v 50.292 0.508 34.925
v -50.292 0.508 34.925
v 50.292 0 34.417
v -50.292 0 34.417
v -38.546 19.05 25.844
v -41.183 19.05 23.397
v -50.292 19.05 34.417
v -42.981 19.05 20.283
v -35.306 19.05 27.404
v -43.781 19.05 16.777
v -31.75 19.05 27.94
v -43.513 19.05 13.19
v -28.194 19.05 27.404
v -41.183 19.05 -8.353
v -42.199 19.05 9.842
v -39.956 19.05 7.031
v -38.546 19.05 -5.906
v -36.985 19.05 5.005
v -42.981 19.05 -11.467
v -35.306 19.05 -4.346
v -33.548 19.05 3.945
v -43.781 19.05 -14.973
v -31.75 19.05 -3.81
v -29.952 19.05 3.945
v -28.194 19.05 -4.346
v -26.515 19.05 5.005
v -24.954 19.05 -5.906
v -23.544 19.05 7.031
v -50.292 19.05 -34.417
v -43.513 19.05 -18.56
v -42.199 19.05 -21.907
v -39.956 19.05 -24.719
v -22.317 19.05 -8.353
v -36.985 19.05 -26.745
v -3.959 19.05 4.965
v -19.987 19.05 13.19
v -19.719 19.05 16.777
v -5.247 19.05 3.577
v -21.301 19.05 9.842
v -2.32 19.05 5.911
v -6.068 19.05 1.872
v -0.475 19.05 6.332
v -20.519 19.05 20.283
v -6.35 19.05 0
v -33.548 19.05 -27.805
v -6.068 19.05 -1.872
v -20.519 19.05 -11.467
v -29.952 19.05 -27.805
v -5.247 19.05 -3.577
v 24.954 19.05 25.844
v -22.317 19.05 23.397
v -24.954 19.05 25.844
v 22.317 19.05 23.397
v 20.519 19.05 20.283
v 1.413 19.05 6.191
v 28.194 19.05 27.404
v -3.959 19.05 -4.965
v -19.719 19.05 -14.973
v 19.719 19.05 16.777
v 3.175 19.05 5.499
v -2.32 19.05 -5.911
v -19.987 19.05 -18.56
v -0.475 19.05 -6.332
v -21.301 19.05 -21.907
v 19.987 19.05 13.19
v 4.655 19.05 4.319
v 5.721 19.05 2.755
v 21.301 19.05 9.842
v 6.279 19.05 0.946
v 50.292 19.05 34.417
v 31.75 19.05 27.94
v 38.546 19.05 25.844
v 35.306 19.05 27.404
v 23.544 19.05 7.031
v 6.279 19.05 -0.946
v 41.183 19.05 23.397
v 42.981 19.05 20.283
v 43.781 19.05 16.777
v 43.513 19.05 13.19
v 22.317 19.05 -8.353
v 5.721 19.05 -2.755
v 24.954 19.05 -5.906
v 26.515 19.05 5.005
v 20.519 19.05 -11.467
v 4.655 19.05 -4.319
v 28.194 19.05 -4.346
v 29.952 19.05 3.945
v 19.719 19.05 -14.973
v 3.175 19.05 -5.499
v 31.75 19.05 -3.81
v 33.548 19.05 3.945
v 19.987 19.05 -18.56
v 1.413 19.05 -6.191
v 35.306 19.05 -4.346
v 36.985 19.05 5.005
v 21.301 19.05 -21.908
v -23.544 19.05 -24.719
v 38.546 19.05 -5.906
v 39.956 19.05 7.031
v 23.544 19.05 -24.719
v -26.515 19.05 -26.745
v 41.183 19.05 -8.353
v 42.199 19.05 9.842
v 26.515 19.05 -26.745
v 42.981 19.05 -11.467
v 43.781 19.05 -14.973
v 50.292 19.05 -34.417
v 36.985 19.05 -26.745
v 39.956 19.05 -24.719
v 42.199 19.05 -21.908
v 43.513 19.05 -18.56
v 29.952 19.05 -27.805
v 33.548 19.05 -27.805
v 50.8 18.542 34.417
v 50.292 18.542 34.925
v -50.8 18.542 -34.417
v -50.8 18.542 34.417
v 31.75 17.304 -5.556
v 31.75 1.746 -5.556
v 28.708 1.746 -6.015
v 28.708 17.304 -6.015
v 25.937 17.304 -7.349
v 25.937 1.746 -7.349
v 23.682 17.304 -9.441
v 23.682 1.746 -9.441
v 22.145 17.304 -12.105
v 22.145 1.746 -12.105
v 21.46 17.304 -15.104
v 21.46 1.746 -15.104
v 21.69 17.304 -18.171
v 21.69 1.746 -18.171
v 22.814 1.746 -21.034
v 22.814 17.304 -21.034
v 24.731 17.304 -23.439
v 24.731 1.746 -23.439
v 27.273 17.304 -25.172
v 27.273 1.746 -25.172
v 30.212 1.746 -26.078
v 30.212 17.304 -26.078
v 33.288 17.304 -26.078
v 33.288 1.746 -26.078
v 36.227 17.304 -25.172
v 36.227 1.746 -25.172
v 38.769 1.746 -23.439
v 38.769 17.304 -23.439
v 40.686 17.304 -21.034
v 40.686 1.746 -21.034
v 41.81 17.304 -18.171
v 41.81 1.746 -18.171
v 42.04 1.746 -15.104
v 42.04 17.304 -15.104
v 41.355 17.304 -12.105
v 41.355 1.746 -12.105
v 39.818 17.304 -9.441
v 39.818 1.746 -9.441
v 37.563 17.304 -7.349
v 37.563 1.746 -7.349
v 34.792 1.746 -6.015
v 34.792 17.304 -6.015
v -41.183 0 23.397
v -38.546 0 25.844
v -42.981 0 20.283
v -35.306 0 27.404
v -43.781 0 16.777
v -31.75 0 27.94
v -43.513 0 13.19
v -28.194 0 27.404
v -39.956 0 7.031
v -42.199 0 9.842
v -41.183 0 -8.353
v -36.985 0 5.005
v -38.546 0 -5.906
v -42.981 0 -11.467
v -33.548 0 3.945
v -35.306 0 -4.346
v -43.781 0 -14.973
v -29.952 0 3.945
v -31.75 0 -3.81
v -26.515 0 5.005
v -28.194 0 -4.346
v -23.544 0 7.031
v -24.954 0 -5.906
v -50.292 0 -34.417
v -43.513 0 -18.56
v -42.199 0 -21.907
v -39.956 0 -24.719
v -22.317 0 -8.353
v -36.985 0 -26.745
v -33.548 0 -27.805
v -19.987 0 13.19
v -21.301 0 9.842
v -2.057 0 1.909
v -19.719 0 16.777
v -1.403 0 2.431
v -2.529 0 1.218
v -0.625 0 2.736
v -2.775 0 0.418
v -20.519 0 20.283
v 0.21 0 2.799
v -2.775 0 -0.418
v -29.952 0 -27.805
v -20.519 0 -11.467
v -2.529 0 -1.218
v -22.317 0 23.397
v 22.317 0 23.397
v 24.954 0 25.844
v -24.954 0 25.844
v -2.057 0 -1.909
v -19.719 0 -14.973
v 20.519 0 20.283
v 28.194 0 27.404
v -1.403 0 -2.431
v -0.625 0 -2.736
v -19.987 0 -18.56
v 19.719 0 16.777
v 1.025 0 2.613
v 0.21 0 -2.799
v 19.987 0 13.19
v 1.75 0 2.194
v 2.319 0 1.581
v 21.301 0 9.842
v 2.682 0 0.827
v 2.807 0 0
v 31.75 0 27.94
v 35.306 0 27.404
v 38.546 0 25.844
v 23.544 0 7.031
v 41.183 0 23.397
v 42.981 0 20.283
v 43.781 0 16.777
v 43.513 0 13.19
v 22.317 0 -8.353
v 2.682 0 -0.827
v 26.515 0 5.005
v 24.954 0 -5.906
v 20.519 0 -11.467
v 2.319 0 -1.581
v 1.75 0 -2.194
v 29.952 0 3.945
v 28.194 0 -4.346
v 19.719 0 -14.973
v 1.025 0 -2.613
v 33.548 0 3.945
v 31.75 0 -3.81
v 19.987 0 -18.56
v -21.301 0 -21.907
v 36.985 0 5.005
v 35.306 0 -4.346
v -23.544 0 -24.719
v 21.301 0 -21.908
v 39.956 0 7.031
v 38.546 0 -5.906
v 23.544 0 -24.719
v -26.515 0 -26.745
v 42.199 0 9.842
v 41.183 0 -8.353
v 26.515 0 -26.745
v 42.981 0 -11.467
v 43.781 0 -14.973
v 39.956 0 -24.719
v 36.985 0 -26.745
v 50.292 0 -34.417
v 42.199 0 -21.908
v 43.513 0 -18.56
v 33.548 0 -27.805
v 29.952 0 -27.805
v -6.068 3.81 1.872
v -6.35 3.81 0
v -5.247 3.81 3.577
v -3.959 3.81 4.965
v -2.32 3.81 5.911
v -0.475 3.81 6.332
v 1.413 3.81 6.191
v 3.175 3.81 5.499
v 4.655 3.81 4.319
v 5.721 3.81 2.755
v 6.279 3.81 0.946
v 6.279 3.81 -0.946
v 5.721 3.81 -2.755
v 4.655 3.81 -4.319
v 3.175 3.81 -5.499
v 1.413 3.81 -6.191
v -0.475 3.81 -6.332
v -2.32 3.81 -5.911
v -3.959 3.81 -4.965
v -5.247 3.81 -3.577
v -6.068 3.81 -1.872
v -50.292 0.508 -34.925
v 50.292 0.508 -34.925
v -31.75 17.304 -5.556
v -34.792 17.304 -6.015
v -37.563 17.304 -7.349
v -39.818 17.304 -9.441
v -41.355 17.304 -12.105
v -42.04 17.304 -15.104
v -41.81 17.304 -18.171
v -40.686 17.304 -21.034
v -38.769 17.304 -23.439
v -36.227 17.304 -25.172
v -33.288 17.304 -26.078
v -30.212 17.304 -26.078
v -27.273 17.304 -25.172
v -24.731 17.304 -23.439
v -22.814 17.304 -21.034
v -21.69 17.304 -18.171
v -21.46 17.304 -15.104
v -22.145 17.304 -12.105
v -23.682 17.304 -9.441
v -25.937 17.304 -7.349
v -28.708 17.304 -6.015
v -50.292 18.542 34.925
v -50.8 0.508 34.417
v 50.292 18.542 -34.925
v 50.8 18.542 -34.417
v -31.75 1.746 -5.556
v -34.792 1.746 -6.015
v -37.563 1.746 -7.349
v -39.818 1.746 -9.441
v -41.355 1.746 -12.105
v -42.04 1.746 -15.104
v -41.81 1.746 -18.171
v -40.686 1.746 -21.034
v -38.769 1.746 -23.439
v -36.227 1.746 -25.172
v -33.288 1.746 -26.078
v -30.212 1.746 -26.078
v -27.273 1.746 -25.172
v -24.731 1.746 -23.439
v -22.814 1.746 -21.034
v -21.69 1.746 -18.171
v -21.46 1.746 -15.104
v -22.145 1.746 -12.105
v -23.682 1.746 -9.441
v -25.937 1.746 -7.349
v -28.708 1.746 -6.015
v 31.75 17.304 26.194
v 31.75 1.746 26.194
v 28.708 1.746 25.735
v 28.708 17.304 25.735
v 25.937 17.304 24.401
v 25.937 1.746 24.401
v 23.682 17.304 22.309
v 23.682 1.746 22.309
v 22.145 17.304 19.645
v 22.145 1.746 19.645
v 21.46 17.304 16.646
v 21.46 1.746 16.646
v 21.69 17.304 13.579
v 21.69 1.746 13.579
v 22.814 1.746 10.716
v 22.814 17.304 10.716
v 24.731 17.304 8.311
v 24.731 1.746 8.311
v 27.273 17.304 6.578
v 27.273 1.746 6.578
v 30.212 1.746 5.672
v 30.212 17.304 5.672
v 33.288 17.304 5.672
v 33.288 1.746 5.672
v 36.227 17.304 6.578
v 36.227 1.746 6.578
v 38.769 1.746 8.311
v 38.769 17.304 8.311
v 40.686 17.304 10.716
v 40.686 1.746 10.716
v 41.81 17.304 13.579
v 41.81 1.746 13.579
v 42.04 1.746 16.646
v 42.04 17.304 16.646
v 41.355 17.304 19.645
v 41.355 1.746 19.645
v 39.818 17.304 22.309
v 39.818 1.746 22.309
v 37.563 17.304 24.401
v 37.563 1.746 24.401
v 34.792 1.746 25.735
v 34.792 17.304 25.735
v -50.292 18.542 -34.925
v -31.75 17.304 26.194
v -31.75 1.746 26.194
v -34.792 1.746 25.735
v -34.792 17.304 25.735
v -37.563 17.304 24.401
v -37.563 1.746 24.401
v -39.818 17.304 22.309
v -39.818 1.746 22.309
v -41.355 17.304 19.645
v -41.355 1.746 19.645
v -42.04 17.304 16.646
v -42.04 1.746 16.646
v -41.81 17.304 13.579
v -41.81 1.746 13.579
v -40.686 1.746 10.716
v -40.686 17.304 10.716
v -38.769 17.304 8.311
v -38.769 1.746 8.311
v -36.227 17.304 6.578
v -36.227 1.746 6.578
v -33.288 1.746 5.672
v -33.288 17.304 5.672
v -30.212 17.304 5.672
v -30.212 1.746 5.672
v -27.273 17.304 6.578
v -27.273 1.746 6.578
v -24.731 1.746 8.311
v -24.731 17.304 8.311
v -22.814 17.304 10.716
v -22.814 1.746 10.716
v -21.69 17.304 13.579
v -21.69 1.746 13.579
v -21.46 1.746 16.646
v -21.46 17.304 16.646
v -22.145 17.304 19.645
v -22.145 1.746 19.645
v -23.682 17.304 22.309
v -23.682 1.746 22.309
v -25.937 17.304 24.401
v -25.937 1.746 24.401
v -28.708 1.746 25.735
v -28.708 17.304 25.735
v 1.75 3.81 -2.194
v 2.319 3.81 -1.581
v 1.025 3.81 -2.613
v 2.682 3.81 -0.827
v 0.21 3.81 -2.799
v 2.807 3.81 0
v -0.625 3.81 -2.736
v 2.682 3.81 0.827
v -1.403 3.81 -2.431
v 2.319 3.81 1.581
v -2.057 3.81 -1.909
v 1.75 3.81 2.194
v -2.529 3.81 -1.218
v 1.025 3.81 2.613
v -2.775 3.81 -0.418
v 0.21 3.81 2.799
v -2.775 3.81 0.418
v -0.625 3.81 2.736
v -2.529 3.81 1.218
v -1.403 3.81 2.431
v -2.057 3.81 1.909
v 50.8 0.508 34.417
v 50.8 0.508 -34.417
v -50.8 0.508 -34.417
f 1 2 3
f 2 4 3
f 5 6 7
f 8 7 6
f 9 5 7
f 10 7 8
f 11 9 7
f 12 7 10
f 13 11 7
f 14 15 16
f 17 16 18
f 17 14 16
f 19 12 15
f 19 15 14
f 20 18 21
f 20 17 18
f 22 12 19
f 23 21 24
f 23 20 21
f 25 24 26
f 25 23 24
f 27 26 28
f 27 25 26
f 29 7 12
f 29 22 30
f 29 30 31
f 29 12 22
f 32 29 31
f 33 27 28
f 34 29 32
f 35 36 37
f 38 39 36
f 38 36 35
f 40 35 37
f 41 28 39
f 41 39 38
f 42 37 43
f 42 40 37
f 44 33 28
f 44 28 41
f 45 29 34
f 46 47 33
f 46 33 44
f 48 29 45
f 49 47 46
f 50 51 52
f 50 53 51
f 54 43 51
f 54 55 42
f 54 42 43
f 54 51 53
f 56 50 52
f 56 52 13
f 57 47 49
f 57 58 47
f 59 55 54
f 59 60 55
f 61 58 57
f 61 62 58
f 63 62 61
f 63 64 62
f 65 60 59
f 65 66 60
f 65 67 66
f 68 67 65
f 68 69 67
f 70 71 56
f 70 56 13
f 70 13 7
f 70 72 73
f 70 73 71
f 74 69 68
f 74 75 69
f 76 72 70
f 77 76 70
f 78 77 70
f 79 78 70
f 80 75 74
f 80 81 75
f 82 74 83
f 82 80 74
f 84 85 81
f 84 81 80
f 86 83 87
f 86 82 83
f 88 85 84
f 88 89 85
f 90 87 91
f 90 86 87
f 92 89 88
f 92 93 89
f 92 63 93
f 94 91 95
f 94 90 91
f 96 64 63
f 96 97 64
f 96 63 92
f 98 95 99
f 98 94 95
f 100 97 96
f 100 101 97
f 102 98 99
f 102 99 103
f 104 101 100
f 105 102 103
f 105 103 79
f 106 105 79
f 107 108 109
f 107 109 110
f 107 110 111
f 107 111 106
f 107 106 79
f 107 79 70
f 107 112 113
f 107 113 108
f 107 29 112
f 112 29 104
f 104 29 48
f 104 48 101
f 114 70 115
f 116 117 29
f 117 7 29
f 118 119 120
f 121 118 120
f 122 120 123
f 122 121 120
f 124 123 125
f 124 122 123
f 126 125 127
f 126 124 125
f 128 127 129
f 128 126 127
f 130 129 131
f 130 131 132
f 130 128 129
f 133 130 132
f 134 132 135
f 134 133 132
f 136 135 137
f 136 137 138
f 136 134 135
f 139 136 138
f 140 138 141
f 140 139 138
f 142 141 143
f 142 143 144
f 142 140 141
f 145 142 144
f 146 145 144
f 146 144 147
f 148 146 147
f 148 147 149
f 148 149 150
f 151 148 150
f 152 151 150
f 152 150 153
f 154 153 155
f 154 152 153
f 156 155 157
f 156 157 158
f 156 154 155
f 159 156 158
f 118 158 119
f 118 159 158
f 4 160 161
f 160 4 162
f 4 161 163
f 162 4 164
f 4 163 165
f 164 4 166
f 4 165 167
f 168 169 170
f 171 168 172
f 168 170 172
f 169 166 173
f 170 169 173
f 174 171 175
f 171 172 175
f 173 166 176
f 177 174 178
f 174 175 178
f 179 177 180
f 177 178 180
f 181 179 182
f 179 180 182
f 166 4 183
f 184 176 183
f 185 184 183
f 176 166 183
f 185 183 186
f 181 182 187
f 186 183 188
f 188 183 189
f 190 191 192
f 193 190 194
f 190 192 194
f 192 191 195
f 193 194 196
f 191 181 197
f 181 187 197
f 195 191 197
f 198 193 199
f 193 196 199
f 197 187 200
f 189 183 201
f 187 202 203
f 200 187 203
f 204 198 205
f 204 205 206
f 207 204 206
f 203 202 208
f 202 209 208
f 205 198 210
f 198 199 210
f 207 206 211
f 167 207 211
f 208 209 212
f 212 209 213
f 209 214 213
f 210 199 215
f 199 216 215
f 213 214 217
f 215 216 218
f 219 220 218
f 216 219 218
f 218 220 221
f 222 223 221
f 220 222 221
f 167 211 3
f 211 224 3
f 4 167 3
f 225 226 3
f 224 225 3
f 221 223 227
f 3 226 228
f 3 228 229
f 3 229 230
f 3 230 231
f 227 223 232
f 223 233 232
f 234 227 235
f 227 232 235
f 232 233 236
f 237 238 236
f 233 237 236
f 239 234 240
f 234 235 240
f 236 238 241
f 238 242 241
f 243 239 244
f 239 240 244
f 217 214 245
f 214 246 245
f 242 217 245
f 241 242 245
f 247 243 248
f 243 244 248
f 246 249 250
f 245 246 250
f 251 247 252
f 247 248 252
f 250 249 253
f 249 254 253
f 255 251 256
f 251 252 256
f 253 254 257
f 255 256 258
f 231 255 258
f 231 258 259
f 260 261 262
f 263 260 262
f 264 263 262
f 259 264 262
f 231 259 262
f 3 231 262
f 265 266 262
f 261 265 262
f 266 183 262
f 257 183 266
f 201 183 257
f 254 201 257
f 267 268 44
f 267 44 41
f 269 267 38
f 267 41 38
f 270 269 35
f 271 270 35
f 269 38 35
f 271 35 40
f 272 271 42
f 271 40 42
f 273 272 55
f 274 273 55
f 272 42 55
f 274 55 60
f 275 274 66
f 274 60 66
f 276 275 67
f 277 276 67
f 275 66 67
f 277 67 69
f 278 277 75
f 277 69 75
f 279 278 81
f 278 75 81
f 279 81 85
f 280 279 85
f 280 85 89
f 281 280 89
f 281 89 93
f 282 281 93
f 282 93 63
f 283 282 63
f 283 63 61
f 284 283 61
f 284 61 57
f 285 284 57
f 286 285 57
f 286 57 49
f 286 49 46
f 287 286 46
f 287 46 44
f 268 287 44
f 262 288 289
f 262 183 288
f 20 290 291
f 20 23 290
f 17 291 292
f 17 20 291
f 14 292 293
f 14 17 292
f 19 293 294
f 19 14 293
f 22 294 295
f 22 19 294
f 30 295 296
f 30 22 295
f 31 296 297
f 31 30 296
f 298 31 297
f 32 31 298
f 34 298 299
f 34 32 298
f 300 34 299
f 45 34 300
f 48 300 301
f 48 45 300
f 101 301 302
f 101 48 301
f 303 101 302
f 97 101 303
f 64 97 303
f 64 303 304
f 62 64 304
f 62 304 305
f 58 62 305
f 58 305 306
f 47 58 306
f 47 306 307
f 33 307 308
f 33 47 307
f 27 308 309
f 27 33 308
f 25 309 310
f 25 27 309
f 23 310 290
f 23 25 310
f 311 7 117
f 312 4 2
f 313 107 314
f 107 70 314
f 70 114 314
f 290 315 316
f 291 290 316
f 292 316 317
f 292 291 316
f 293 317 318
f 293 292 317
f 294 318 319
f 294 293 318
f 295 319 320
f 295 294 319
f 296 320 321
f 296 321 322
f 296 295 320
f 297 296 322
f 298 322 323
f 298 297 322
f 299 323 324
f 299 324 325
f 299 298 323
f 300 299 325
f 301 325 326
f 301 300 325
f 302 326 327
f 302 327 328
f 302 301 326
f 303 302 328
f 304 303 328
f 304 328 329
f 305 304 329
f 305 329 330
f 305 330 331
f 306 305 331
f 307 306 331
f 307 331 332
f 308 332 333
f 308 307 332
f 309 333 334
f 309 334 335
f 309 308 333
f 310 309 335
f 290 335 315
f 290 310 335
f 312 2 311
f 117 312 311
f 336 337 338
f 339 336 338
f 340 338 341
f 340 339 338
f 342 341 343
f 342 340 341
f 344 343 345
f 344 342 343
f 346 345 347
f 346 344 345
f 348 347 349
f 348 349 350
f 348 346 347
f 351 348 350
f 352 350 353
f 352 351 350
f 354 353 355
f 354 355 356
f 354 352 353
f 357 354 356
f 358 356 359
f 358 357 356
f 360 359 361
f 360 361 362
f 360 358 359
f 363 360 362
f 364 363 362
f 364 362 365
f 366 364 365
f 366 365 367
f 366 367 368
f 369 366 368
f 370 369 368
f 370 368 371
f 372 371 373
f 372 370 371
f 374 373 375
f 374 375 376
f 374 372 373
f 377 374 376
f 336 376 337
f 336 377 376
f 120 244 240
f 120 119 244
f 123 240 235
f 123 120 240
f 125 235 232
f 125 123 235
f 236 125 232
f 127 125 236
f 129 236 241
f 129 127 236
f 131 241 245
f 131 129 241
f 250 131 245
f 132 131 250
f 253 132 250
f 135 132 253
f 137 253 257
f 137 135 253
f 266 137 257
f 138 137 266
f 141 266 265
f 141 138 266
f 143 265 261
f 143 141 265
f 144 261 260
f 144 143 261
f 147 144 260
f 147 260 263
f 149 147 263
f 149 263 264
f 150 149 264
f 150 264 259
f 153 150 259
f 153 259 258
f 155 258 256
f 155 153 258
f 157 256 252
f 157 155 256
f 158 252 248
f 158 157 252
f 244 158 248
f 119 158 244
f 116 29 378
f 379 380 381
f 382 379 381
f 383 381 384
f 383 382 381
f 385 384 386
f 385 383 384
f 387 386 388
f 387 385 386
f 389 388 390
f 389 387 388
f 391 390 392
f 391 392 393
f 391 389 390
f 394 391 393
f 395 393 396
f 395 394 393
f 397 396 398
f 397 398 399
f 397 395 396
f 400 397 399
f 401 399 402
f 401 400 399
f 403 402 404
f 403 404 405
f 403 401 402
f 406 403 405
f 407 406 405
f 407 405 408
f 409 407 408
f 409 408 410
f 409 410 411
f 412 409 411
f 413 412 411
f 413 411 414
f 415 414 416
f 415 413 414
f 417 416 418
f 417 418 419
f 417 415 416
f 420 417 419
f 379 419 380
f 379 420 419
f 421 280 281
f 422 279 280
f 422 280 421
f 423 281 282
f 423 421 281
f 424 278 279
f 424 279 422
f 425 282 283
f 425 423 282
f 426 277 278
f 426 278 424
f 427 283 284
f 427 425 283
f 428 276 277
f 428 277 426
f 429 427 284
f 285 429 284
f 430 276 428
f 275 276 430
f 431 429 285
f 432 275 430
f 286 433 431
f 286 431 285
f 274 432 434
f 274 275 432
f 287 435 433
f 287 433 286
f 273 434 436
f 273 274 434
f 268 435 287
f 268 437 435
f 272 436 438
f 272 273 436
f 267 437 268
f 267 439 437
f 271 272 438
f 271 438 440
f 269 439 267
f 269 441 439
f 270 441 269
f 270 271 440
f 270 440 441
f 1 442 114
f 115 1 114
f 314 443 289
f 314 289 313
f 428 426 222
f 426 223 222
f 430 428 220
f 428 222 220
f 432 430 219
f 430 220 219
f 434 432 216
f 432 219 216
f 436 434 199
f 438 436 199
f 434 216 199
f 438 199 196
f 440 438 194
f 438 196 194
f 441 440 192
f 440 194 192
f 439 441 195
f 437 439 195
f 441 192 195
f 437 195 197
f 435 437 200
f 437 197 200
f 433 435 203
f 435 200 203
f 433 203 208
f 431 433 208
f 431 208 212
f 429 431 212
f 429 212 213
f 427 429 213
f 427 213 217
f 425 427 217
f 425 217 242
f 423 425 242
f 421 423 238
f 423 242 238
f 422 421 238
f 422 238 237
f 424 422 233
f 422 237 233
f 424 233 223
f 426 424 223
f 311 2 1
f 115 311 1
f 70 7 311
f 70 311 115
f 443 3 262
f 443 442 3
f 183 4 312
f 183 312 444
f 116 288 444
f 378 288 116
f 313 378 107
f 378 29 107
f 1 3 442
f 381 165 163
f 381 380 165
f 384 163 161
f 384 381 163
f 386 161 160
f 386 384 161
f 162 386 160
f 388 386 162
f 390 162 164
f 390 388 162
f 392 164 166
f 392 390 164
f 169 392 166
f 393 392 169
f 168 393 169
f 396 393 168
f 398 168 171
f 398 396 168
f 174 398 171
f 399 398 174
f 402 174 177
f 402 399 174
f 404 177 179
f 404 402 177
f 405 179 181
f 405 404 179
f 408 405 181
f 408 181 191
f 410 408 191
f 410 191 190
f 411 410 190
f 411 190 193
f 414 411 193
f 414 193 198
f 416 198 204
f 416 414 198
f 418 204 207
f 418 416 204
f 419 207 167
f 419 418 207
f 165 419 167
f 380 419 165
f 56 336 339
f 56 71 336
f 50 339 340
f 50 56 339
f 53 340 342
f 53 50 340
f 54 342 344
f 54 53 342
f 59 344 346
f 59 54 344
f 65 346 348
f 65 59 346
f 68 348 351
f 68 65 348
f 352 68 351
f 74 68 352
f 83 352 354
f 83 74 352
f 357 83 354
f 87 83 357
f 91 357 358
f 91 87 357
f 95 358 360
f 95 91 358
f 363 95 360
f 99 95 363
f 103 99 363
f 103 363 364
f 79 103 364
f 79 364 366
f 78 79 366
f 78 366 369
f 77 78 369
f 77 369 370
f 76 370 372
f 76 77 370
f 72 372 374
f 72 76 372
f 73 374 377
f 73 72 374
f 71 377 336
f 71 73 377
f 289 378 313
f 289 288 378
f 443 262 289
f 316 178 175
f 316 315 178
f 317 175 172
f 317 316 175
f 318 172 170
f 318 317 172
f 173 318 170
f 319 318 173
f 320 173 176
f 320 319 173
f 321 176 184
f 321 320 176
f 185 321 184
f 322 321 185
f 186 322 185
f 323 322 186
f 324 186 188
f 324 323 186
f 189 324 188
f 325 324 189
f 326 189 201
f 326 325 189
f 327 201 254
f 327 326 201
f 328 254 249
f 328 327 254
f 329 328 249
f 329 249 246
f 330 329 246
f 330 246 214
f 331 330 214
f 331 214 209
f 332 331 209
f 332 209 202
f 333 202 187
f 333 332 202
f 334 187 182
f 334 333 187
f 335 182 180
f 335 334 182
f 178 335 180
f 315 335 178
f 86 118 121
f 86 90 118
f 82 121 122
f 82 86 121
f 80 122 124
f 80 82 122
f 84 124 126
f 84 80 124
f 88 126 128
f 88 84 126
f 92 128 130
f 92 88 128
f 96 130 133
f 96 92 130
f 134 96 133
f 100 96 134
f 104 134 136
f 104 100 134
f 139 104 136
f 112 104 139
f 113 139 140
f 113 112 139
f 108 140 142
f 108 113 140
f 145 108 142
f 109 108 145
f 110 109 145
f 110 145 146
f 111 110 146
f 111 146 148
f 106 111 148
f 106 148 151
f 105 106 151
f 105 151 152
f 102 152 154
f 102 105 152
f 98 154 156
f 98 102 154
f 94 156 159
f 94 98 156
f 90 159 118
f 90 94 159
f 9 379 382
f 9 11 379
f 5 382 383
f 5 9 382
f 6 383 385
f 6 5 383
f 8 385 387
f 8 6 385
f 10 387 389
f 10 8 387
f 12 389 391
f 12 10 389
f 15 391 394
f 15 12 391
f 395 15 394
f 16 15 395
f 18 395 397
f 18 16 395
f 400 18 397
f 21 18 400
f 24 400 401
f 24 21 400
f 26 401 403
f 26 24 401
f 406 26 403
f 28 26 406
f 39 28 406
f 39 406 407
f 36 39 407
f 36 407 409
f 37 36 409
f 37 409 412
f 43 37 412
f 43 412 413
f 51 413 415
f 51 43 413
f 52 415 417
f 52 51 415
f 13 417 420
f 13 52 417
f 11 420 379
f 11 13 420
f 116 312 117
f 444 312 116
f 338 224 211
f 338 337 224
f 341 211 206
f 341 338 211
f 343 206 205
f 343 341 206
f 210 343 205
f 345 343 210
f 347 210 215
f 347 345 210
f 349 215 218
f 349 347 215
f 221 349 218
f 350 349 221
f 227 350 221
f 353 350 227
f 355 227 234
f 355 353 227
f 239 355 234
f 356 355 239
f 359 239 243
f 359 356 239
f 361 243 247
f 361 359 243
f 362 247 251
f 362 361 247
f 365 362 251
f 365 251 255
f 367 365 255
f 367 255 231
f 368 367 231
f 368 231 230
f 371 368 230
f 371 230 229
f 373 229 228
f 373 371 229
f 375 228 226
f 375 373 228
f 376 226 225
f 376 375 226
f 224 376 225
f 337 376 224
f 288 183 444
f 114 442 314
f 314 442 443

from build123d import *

# Parameters (mm, degrees)
SKETCH1_W                                       = 101.6
SKETCH1_H                                       = 69.85
EXTRUDE1_DEPTH                                  = 19.05
F_13_16_0_8125_DIAMETER_HOLE1_AT_2_COUNT        = 2
F_13_16_0_8125_DIAMETER_HOLE1_AT_2_PITCH        = 31.75
F_13_16_0_8125_DIAMETER_HOLE1_AT_3_COUNT        = 2
F_13_16_0_8125_DIAMETER_HOLE1_AT_3_PITCH        = 70.995158286
F_13_16_0_8125_DIAMETER_HOLE1_AT_4_COUNT        = 2
F_13_16_0_8125_DIAMETER_HOLE1_AT_4_PITCH        = 63.5
CBORE_FOR_10_SOCKET_HEAD_CAP_SCREW1_D           = 5.6134
CBORE_FOR_10_SOCKET_HEAD_CAP_SCREW1_CBORE_D     = 12.7
CBORE_FOR_10_SOCKET_HEAD_CAP_SCREW1_CBORE_DEPTH = 15.24
CHAMFER1_SIZE                                   = 0.508


with BuildPart() as part:
    # Sketch1 → Extrude1 (new body)
    with BuildSketch(Plane(origin=(0, 0, 0), x_dir=(1, 0, 0), z_dir=(0, 1, 0))):
        Rectangle(SKETCH1_W, SKETCH1_H)
    extrude(amount=EXTRUDE1_DEPTH)

    # Sketch3 → 13/16 (0.8125) Diameter Hole1 (revolve, cut)
    with BuildSketch(Plane(origin=(31.75, 19.05, 15.875), x_dir=(0, 0, 1), z_dir=(1, 0, 0))):
        Polygon((0, 0), (0, 19.05), (12.065, 19.05), (10.31875, 17.30375), (10.31875, 1.74625), (12.065, 0), align=None)
    f_13_16_0_8125_diameter_hole1 = revolve(axis=Axis((31.75, 25.4, 15.875), (0, -1, 0)), mode=Mode.SUBTRACT)

    # 13/16 (0.8125) Diameter Hole1 at 2: 13/16 (0.8125) Diameter Hole1 ×2
    with Locations(*[(0, 0, -i * F_13_16_0_8125_DIAMETER_HOLE1_AT_2_PITCH) for i in range(1, F_13_16_0_8125_DIAMETER_HOLE1_AT_2_COUNT)]):
        add(f_13_16_0_8125_diameter_hole1, mode=Mode.SUBTRACT)

    # 13/16 (0.8125) Diameter Hole1 at 3: 13/16 (0.8125) Diameter Hole1 ×2
    with Locations(*[Vector(-0.894427191, 0, -0.447213595) * (i * F_13_16_0_8125_DIAMETER_HOLE1_AT_3_PITCH) for i in range(1, F_13_16_0_8125_DIAMETER_HOLE1_AT_3_COUNT)]):
        add(f_13_16_0_8125_diameter_hole1, mode=Mode.SUBTRACT)

    # 13/16 (0.8125) Diameter Hole1 at 4: 13/16 (0.8125) Diameter Hole1 ×2
    with Locations(*[(-i * F_13_16_0_8125_DIAMETER_HOLE1_AT_4_PITCH, 0, 0) for i in range(1, F_13_16_0_8125_DIAMETER_HOLE1_AT_4_COUNT)]):
        add(f_13_16_0_8125_diameter_hole1, mode=Mode.SUBTRACT)

    # CBORE for #10 Socket Head Cap Screw1 (through all)
    with Locations(Plane(origin=(0, 19.05, 0), x_dir=(-1, 0, 0), z_dir=(0, 1, 0))):
        with Locations((0, 0)):
            CounterBoreHole(CBORE_FOR_10_SOCKET_HEAD_CAP_SCREW1_D / 2, CBORE_FOR_10_SOCKET_HEAD_CAP_SCREW1_CBORE_D / 2, CBORE_FOR_10_SOCKET_HEAD_CAP_SCREW1_CBORE_DEPTH)

    # Chamfer1
    chamfer1_edges = [part.edges().sort_by_distance(p)[0] for p in [
        (50.8, 19.05, 0),
        (0, 19.05, -34.925),
        (-50.8, 19.05, 0),
        (0, 0, -34.925),
        (50.8, 0, 0),
        (0, 0, 34.925),
        (-50.8, 0, 0),
        (0, 19.05, 34.925),
        (-50.8, 9.525, -34.925),
        (50.8, 9.525, -34.925),
        (50.8, 9.525, 34.925),
        (-50.8, 9.525, 34.925),
    ]]
    chamfer(chamfer1_edges, length=CHAMFER1_SIZE)


solid = part.part
